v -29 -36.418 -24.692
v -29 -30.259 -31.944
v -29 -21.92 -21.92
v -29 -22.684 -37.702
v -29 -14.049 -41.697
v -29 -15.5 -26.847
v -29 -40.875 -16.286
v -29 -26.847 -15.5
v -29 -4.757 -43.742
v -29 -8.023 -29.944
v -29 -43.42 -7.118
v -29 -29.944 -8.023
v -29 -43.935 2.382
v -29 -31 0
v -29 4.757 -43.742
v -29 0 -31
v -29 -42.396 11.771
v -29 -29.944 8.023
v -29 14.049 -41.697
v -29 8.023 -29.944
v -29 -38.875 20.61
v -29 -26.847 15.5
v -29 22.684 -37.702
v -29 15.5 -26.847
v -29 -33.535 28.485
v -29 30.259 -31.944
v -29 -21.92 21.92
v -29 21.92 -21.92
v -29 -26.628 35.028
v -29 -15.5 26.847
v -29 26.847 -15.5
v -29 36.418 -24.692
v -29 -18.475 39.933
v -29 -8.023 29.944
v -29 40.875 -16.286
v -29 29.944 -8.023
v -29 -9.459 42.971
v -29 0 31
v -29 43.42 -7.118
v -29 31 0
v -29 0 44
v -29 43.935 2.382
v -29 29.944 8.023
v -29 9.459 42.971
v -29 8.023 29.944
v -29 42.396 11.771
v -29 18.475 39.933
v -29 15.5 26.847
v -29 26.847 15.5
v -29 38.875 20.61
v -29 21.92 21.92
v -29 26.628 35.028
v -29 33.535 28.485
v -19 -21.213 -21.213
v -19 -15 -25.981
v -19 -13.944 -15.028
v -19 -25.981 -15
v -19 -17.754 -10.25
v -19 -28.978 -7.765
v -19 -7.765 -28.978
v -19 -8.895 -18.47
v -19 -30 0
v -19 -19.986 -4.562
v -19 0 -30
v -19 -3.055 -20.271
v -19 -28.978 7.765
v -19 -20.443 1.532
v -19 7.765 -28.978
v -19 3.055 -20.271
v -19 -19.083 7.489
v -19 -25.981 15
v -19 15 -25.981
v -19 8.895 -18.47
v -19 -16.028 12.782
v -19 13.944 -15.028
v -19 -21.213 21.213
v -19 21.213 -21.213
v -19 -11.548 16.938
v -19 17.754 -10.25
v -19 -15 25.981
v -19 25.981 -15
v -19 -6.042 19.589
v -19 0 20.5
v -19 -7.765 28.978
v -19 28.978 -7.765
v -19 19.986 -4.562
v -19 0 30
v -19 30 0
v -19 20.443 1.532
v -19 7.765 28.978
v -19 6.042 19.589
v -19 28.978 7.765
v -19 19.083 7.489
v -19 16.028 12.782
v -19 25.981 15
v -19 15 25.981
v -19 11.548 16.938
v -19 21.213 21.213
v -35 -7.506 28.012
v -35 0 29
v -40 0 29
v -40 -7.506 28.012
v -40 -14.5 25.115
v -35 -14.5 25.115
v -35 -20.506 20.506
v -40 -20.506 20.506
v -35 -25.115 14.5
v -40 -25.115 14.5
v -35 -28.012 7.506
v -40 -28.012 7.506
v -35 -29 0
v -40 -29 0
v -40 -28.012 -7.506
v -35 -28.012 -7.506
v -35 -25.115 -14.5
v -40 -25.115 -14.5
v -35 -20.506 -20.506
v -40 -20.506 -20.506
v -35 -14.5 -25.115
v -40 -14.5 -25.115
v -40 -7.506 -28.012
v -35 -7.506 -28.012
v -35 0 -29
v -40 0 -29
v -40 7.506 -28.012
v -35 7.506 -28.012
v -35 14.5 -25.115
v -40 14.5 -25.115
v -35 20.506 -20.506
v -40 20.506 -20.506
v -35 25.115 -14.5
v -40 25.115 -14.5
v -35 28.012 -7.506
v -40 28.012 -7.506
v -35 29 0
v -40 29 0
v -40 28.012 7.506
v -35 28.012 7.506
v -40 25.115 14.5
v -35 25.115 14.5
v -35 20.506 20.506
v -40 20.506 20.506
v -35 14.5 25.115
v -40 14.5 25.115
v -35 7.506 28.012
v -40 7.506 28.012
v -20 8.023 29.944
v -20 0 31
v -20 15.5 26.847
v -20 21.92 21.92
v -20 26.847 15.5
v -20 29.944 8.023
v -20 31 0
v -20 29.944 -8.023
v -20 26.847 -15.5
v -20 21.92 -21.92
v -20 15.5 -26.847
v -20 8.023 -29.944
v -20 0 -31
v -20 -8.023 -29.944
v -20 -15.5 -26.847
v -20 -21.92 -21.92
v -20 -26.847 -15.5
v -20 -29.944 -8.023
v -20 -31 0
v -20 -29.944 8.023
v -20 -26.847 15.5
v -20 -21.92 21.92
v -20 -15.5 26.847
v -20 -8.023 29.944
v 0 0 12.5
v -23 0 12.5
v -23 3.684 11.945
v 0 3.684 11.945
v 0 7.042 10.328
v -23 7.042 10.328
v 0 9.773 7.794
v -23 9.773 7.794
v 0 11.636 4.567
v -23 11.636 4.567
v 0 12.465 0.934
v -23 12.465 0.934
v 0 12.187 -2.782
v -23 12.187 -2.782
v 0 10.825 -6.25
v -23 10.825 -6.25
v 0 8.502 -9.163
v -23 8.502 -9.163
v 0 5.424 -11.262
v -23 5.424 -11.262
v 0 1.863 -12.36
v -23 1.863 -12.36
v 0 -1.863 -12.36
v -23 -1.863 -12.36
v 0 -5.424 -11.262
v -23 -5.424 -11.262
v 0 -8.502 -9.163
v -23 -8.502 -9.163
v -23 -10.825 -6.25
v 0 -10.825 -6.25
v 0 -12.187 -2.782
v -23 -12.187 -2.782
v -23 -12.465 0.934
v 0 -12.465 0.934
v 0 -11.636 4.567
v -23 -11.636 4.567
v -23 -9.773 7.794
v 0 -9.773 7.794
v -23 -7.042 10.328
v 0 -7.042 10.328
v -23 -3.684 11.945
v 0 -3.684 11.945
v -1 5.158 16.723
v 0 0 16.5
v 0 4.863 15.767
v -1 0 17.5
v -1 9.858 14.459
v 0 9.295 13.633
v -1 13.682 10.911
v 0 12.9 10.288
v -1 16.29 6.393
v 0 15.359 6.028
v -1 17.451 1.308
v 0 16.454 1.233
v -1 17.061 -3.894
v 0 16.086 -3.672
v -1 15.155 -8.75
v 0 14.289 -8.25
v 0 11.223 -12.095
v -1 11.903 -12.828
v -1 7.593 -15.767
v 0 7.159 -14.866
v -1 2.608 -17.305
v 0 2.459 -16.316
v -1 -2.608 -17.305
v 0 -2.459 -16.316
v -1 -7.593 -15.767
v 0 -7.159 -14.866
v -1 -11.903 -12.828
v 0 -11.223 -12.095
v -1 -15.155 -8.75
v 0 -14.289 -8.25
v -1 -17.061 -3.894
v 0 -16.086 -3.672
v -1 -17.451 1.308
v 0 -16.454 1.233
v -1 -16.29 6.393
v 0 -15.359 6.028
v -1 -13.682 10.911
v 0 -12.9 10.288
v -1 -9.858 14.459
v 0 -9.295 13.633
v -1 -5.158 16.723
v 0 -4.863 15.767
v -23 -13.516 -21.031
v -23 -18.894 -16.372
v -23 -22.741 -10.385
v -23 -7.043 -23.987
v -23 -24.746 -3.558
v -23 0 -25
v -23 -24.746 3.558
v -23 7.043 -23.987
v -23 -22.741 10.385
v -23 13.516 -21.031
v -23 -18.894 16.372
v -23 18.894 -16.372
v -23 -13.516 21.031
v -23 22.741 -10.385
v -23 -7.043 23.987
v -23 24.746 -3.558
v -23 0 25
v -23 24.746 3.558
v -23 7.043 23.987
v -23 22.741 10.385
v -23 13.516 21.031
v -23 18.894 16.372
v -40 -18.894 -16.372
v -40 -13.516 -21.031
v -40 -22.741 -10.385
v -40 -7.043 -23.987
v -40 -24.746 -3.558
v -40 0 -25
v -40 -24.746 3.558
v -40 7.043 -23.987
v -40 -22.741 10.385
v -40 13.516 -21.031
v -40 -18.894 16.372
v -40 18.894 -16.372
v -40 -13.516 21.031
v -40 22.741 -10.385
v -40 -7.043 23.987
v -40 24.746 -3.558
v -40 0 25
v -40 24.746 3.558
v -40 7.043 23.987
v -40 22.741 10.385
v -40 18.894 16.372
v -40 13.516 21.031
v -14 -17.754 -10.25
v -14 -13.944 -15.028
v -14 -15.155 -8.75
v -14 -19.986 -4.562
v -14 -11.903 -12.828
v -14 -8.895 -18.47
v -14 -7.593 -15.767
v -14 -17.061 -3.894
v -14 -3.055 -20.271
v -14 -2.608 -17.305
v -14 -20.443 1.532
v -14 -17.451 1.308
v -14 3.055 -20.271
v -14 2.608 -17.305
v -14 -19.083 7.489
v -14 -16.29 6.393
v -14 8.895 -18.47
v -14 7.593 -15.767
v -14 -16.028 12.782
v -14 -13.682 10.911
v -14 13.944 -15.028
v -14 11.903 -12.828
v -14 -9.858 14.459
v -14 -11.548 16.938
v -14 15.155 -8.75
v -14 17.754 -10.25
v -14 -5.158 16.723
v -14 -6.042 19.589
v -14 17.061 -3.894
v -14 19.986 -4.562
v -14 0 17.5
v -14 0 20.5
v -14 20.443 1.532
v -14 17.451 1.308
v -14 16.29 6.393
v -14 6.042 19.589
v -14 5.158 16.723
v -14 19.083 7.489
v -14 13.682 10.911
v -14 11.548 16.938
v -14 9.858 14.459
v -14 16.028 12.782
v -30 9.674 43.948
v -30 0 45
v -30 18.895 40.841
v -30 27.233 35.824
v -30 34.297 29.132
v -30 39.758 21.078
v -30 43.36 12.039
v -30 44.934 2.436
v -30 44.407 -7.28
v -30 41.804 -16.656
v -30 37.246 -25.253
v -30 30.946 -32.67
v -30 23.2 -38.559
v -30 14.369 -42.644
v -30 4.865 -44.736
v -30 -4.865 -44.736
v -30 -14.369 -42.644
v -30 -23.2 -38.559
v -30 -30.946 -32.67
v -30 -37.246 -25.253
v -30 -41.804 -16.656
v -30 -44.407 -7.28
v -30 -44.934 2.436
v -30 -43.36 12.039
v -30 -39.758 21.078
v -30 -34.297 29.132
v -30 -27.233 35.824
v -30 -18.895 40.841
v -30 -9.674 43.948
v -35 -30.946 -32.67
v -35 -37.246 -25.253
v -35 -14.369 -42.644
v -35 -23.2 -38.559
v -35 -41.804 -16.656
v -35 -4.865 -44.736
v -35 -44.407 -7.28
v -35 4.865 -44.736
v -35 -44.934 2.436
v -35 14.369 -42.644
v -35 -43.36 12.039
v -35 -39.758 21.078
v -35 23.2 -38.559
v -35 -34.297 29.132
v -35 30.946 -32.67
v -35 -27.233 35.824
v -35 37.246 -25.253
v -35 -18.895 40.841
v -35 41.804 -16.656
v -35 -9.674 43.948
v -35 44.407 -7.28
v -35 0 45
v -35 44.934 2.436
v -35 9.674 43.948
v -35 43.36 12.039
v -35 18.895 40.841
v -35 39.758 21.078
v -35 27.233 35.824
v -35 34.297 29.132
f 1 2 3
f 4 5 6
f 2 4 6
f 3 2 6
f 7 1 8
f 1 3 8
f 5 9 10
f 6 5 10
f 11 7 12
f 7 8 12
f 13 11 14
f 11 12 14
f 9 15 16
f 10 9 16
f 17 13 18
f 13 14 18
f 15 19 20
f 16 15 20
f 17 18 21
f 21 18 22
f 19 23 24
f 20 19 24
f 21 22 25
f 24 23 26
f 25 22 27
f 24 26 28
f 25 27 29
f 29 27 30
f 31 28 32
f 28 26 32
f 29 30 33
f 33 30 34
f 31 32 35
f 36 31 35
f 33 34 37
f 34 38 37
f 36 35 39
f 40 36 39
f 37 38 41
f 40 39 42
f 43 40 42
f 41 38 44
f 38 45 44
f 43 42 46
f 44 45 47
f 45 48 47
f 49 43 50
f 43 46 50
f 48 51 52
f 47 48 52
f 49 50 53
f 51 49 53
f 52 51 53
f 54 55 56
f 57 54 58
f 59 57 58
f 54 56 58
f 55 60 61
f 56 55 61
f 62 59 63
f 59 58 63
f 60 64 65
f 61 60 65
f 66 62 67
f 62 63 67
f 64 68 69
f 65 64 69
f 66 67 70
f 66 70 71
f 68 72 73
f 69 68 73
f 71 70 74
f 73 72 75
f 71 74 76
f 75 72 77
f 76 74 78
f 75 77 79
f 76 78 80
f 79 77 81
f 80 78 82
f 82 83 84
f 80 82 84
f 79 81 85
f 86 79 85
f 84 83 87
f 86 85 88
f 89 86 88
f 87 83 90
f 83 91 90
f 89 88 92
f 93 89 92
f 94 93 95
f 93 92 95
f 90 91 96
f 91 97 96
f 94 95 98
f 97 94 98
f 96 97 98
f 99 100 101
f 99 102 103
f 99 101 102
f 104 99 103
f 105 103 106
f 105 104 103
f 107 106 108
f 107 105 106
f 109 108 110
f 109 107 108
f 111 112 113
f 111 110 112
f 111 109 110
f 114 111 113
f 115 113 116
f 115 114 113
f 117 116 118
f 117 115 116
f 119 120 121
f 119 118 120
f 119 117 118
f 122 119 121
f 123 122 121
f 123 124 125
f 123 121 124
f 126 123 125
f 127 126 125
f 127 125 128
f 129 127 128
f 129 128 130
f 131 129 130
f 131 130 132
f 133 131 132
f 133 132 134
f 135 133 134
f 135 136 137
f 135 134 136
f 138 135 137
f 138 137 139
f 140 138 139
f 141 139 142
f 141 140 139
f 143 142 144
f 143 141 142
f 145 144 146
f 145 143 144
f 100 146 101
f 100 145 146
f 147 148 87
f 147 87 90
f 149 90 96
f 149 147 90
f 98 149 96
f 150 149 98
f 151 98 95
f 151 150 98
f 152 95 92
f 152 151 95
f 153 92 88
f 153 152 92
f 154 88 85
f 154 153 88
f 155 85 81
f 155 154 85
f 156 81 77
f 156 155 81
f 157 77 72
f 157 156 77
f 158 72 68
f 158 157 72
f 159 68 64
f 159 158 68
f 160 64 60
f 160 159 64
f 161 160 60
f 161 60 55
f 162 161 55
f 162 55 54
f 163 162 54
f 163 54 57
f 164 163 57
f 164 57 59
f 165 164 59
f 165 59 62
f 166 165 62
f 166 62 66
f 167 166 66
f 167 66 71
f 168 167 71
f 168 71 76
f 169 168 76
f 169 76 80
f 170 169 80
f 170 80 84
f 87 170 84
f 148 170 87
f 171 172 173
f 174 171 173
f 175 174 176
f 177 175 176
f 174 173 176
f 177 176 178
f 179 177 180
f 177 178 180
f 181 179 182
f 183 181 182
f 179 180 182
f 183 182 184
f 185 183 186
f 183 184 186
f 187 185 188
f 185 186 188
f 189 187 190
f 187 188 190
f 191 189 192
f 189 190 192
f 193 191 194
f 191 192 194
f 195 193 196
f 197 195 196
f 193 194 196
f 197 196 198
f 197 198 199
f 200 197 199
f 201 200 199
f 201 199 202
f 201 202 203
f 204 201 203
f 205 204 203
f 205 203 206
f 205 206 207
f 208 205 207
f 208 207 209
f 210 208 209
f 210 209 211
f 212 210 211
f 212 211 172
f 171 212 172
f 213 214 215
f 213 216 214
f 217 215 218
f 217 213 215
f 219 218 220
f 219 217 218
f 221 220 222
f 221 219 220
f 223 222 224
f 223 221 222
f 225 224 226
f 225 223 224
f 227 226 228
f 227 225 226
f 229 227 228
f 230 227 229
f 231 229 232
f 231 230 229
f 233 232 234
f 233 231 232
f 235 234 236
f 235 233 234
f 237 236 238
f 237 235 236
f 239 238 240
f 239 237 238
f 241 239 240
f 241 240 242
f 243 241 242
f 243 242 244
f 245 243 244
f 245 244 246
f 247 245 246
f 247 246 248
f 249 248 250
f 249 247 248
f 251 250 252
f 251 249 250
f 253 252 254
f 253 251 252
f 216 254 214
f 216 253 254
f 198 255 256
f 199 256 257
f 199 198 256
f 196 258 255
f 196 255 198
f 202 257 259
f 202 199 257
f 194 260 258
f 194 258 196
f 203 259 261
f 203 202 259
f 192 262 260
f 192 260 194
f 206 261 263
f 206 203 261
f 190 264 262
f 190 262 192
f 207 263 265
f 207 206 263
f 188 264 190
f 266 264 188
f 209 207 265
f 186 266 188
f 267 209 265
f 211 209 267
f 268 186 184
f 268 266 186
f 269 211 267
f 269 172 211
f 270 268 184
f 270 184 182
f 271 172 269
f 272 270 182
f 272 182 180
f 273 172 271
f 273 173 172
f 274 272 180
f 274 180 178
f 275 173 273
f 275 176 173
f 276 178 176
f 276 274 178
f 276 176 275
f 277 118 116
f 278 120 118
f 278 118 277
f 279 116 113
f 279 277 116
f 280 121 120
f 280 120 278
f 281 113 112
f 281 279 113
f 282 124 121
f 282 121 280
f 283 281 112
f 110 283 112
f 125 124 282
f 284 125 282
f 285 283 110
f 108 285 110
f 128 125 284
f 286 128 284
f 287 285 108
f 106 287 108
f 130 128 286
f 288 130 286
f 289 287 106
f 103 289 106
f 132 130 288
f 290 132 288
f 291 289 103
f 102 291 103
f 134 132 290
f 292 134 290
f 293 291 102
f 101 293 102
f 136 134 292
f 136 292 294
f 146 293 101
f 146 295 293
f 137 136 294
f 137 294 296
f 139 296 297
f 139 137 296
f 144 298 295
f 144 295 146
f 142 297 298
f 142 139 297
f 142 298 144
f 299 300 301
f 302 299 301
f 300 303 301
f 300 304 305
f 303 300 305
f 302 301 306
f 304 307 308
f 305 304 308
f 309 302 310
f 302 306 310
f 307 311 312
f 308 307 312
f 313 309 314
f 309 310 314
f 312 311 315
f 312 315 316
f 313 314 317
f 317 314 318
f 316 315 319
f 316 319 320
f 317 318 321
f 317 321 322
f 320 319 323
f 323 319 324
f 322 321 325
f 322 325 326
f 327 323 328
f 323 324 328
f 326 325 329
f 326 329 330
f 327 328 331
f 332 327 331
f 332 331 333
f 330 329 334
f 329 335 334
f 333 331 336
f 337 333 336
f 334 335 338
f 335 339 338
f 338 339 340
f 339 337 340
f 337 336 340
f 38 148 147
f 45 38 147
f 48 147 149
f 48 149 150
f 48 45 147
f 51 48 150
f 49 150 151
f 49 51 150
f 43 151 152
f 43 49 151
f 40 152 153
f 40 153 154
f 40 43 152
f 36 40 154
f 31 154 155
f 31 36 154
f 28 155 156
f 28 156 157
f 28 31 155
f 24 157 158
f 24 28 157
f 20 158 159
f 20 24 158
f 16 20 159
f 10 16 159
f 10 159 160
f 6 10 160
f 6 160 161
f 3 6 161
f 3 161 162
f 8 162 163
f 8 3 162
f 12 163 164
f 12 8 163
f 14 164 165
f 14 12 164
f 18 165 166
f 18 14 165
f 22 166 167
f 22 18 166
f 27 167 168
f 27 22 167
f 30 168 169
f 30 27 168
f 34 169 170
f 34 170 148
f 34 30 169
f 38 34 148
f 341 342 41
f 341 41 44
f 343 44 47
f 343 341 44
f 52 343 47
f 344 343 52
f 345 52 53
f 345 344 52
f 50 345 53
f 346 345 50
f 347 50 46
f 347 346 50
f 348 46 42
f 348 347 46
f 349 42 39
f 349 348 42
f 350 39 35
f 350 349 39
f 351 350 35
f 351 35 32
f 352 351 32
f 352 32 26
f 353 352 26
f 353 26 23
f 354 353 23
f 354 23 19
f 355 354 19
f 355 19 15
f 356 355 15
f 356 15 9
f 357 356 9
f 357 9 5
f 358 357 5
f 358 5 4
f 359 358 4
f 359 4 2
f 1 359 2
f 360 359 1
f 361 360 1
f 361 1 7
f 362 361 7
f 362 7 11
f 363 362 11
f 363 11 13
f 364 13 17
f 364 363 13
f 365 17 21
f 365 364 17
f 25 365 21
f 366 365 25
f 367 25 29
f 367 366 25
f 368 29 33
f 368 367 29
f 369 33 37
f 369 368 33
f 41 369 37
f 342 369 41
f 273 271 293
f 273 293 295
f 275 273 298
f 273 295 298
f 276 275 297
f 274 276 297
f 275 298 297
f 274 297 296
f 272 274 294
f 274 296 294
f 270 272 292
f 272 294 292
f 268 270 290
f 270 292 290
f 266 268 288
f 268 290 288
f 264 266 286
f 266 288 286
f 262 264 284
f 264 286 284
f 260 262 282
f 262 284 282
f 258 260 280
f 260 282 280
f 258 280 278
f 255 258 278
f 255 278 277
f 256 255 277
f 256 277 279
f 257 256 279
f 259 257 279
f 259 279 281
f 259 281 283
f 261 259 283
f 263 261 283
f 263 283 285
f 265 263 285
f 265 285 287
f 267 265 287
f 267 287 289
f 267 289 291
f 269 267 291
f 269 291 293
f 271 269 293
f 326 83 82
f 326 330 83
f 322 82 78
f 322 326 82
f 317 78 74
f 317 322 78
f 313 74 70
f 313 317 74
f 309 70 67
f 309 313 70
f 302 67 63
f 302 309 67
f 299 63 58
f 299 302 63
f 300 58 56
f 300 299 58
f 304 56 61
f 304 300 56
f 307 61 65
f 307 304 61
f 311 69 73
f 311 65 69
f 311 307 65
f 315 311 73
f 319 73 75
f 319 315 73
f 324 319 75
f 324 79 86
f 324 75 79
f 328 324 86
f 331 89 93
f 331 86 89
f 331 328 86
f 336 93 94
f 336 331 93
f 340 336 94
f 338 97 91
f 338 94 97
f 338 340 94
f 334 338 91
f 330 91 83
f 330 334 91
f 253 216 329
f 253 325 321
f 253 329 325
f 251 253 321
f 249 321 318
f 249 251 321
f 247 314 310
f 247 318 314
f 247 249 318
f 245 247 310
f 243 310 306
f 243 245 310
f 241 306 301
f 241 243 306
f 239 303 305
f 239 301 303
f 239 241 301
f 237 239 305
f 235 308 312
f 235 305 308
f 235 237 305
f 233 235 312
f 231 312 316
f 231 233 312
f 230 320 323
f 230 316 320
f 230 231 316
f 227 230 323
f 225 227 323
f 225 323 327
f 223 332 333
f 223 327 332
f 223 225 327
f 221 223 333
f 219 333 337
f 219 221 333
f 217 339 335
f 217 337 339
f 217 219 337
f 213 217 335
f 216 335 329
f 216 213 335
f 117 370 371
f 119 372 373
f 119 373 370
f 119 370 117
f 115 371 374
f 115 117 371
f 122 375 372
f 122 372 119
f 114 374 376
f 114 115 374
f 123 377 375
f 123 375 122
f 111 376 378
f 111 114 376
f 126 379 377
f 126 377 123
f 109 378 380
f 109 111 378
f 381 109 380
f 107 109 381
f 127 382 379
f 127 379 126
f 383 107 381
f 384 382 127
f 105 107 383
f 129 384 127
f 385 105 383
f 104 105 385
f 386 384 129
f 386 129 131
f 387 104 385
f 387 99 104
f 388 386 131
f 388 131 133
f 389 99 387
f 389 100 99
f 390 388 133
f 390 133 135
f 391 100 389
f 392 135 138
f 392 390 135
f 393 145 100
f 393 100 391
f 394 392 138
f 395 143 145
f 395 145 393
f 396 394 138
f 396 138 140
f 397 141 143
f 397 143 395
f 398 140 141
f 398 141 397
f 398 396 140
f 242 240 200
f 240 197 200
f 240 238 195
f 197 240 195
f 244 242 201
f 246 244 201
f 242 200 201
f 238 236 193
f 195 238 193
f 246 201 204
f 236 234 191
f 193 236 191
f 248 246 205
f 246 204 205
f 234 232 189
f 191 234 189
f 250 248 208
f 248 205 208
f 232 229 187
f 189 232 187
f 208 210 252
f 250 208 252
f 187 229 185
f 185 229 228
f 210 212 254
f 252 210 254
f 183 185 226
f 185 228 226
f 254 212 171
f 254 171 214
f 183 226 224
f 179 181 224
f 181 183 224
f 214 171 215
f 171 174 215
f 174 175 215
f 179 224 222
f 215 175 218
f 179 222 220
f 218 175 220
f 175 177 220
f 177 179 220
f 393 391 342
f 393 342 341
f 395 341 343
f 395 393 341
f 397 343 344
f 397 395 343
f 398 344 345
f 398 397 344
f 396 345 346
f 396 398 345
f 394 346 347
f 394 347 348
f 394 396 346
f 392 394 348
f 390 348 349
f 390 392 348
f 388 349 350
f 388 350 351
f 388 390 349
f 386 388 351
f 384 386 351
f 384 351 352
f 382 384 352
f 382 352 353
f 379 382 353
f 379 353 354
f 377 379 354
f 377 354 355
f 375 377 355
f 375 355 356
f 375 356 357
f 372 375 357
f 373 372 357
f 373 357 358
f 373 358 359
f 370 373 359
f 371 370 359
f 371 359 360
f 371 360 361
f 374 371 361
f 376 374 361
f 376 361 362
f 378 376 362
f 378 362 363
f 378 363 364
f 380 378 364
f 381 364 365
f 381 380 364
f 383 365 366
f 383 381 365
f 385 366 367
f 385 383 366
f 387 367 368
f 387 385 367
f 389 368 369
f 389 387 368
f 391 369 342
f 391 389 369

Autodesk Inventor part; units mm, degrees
ref_plane "YZ Plane" through (0, 0, 0) normal (1, 0, 0) x (0, 1, 0)
ref_plane "XZ Plane" through (0, 0, 0) normal (0, 1, 0) x (-1, 0, 0)
ref_plane "XY Plane" through (0, 0, 0) normal (0, 0, 1) x (1, 0, 0)
sketch "Sketch1" plane through (0, 0, 0) normal (0, 1, 0) x (-1, 0, 0)
  line L0 (0, 0) -> (89.1742, 0)
  line L1 (29, 31) -> (29, 45)
  line L2 (29, 45) -> (35, 45)
  line L3 (35, 45) -> (35, 25)
  line L4 (14, 17.5) -> (0, 17.5)
  line L5 (0, 12.5) -> (23, 12.5)
  line L6 (19, 20.5) -> (19, 31)
  line L7 (19, 31) -> (29, 31)
  line L8 (35, 25) -> (23, 25)
  line L9 (23, 25) -> (23, 12.5)
  line L10 (0, 17.5) -> (0, 12.5)
  line L11 (19, 20.5) -> (14, 20.5)
  line L12 (14, 20.5) -> (14, 17.5)
  line L13 (35, 25) -> (40, 25)
  line L14 (40, 25) -> (40, 29)
  line L15 (40, 29) -> (35, 29)
  dimension "d3" = 50
  dimension "d4" = 35
  dimension "d5" = 5
  dimension "d6" = 12
  dimension "d7" = 6
  dimension "d8" = 4
  dimension "d9" = 35
  dimension "d10" = 6
  dimension "d11" = 20
  dimension "d12" = 6
  dimension "d14" = 5
  dimension "d15" = 3
  dimension "d22" = 4
  dimension "d23" = 5
revolve "Revolution1" add sketch "Sketch1" angle 360 about axis through (0, 0, 0) along (-1, 0, 0)
chamfer "Chamfer2" distance 1 angle 45 3 edges at (-29, 0, -45) (-19, 0, -31) (0, 0, -17.5)
properties part number "2 nd output shaft" material "Steel, Mild"
